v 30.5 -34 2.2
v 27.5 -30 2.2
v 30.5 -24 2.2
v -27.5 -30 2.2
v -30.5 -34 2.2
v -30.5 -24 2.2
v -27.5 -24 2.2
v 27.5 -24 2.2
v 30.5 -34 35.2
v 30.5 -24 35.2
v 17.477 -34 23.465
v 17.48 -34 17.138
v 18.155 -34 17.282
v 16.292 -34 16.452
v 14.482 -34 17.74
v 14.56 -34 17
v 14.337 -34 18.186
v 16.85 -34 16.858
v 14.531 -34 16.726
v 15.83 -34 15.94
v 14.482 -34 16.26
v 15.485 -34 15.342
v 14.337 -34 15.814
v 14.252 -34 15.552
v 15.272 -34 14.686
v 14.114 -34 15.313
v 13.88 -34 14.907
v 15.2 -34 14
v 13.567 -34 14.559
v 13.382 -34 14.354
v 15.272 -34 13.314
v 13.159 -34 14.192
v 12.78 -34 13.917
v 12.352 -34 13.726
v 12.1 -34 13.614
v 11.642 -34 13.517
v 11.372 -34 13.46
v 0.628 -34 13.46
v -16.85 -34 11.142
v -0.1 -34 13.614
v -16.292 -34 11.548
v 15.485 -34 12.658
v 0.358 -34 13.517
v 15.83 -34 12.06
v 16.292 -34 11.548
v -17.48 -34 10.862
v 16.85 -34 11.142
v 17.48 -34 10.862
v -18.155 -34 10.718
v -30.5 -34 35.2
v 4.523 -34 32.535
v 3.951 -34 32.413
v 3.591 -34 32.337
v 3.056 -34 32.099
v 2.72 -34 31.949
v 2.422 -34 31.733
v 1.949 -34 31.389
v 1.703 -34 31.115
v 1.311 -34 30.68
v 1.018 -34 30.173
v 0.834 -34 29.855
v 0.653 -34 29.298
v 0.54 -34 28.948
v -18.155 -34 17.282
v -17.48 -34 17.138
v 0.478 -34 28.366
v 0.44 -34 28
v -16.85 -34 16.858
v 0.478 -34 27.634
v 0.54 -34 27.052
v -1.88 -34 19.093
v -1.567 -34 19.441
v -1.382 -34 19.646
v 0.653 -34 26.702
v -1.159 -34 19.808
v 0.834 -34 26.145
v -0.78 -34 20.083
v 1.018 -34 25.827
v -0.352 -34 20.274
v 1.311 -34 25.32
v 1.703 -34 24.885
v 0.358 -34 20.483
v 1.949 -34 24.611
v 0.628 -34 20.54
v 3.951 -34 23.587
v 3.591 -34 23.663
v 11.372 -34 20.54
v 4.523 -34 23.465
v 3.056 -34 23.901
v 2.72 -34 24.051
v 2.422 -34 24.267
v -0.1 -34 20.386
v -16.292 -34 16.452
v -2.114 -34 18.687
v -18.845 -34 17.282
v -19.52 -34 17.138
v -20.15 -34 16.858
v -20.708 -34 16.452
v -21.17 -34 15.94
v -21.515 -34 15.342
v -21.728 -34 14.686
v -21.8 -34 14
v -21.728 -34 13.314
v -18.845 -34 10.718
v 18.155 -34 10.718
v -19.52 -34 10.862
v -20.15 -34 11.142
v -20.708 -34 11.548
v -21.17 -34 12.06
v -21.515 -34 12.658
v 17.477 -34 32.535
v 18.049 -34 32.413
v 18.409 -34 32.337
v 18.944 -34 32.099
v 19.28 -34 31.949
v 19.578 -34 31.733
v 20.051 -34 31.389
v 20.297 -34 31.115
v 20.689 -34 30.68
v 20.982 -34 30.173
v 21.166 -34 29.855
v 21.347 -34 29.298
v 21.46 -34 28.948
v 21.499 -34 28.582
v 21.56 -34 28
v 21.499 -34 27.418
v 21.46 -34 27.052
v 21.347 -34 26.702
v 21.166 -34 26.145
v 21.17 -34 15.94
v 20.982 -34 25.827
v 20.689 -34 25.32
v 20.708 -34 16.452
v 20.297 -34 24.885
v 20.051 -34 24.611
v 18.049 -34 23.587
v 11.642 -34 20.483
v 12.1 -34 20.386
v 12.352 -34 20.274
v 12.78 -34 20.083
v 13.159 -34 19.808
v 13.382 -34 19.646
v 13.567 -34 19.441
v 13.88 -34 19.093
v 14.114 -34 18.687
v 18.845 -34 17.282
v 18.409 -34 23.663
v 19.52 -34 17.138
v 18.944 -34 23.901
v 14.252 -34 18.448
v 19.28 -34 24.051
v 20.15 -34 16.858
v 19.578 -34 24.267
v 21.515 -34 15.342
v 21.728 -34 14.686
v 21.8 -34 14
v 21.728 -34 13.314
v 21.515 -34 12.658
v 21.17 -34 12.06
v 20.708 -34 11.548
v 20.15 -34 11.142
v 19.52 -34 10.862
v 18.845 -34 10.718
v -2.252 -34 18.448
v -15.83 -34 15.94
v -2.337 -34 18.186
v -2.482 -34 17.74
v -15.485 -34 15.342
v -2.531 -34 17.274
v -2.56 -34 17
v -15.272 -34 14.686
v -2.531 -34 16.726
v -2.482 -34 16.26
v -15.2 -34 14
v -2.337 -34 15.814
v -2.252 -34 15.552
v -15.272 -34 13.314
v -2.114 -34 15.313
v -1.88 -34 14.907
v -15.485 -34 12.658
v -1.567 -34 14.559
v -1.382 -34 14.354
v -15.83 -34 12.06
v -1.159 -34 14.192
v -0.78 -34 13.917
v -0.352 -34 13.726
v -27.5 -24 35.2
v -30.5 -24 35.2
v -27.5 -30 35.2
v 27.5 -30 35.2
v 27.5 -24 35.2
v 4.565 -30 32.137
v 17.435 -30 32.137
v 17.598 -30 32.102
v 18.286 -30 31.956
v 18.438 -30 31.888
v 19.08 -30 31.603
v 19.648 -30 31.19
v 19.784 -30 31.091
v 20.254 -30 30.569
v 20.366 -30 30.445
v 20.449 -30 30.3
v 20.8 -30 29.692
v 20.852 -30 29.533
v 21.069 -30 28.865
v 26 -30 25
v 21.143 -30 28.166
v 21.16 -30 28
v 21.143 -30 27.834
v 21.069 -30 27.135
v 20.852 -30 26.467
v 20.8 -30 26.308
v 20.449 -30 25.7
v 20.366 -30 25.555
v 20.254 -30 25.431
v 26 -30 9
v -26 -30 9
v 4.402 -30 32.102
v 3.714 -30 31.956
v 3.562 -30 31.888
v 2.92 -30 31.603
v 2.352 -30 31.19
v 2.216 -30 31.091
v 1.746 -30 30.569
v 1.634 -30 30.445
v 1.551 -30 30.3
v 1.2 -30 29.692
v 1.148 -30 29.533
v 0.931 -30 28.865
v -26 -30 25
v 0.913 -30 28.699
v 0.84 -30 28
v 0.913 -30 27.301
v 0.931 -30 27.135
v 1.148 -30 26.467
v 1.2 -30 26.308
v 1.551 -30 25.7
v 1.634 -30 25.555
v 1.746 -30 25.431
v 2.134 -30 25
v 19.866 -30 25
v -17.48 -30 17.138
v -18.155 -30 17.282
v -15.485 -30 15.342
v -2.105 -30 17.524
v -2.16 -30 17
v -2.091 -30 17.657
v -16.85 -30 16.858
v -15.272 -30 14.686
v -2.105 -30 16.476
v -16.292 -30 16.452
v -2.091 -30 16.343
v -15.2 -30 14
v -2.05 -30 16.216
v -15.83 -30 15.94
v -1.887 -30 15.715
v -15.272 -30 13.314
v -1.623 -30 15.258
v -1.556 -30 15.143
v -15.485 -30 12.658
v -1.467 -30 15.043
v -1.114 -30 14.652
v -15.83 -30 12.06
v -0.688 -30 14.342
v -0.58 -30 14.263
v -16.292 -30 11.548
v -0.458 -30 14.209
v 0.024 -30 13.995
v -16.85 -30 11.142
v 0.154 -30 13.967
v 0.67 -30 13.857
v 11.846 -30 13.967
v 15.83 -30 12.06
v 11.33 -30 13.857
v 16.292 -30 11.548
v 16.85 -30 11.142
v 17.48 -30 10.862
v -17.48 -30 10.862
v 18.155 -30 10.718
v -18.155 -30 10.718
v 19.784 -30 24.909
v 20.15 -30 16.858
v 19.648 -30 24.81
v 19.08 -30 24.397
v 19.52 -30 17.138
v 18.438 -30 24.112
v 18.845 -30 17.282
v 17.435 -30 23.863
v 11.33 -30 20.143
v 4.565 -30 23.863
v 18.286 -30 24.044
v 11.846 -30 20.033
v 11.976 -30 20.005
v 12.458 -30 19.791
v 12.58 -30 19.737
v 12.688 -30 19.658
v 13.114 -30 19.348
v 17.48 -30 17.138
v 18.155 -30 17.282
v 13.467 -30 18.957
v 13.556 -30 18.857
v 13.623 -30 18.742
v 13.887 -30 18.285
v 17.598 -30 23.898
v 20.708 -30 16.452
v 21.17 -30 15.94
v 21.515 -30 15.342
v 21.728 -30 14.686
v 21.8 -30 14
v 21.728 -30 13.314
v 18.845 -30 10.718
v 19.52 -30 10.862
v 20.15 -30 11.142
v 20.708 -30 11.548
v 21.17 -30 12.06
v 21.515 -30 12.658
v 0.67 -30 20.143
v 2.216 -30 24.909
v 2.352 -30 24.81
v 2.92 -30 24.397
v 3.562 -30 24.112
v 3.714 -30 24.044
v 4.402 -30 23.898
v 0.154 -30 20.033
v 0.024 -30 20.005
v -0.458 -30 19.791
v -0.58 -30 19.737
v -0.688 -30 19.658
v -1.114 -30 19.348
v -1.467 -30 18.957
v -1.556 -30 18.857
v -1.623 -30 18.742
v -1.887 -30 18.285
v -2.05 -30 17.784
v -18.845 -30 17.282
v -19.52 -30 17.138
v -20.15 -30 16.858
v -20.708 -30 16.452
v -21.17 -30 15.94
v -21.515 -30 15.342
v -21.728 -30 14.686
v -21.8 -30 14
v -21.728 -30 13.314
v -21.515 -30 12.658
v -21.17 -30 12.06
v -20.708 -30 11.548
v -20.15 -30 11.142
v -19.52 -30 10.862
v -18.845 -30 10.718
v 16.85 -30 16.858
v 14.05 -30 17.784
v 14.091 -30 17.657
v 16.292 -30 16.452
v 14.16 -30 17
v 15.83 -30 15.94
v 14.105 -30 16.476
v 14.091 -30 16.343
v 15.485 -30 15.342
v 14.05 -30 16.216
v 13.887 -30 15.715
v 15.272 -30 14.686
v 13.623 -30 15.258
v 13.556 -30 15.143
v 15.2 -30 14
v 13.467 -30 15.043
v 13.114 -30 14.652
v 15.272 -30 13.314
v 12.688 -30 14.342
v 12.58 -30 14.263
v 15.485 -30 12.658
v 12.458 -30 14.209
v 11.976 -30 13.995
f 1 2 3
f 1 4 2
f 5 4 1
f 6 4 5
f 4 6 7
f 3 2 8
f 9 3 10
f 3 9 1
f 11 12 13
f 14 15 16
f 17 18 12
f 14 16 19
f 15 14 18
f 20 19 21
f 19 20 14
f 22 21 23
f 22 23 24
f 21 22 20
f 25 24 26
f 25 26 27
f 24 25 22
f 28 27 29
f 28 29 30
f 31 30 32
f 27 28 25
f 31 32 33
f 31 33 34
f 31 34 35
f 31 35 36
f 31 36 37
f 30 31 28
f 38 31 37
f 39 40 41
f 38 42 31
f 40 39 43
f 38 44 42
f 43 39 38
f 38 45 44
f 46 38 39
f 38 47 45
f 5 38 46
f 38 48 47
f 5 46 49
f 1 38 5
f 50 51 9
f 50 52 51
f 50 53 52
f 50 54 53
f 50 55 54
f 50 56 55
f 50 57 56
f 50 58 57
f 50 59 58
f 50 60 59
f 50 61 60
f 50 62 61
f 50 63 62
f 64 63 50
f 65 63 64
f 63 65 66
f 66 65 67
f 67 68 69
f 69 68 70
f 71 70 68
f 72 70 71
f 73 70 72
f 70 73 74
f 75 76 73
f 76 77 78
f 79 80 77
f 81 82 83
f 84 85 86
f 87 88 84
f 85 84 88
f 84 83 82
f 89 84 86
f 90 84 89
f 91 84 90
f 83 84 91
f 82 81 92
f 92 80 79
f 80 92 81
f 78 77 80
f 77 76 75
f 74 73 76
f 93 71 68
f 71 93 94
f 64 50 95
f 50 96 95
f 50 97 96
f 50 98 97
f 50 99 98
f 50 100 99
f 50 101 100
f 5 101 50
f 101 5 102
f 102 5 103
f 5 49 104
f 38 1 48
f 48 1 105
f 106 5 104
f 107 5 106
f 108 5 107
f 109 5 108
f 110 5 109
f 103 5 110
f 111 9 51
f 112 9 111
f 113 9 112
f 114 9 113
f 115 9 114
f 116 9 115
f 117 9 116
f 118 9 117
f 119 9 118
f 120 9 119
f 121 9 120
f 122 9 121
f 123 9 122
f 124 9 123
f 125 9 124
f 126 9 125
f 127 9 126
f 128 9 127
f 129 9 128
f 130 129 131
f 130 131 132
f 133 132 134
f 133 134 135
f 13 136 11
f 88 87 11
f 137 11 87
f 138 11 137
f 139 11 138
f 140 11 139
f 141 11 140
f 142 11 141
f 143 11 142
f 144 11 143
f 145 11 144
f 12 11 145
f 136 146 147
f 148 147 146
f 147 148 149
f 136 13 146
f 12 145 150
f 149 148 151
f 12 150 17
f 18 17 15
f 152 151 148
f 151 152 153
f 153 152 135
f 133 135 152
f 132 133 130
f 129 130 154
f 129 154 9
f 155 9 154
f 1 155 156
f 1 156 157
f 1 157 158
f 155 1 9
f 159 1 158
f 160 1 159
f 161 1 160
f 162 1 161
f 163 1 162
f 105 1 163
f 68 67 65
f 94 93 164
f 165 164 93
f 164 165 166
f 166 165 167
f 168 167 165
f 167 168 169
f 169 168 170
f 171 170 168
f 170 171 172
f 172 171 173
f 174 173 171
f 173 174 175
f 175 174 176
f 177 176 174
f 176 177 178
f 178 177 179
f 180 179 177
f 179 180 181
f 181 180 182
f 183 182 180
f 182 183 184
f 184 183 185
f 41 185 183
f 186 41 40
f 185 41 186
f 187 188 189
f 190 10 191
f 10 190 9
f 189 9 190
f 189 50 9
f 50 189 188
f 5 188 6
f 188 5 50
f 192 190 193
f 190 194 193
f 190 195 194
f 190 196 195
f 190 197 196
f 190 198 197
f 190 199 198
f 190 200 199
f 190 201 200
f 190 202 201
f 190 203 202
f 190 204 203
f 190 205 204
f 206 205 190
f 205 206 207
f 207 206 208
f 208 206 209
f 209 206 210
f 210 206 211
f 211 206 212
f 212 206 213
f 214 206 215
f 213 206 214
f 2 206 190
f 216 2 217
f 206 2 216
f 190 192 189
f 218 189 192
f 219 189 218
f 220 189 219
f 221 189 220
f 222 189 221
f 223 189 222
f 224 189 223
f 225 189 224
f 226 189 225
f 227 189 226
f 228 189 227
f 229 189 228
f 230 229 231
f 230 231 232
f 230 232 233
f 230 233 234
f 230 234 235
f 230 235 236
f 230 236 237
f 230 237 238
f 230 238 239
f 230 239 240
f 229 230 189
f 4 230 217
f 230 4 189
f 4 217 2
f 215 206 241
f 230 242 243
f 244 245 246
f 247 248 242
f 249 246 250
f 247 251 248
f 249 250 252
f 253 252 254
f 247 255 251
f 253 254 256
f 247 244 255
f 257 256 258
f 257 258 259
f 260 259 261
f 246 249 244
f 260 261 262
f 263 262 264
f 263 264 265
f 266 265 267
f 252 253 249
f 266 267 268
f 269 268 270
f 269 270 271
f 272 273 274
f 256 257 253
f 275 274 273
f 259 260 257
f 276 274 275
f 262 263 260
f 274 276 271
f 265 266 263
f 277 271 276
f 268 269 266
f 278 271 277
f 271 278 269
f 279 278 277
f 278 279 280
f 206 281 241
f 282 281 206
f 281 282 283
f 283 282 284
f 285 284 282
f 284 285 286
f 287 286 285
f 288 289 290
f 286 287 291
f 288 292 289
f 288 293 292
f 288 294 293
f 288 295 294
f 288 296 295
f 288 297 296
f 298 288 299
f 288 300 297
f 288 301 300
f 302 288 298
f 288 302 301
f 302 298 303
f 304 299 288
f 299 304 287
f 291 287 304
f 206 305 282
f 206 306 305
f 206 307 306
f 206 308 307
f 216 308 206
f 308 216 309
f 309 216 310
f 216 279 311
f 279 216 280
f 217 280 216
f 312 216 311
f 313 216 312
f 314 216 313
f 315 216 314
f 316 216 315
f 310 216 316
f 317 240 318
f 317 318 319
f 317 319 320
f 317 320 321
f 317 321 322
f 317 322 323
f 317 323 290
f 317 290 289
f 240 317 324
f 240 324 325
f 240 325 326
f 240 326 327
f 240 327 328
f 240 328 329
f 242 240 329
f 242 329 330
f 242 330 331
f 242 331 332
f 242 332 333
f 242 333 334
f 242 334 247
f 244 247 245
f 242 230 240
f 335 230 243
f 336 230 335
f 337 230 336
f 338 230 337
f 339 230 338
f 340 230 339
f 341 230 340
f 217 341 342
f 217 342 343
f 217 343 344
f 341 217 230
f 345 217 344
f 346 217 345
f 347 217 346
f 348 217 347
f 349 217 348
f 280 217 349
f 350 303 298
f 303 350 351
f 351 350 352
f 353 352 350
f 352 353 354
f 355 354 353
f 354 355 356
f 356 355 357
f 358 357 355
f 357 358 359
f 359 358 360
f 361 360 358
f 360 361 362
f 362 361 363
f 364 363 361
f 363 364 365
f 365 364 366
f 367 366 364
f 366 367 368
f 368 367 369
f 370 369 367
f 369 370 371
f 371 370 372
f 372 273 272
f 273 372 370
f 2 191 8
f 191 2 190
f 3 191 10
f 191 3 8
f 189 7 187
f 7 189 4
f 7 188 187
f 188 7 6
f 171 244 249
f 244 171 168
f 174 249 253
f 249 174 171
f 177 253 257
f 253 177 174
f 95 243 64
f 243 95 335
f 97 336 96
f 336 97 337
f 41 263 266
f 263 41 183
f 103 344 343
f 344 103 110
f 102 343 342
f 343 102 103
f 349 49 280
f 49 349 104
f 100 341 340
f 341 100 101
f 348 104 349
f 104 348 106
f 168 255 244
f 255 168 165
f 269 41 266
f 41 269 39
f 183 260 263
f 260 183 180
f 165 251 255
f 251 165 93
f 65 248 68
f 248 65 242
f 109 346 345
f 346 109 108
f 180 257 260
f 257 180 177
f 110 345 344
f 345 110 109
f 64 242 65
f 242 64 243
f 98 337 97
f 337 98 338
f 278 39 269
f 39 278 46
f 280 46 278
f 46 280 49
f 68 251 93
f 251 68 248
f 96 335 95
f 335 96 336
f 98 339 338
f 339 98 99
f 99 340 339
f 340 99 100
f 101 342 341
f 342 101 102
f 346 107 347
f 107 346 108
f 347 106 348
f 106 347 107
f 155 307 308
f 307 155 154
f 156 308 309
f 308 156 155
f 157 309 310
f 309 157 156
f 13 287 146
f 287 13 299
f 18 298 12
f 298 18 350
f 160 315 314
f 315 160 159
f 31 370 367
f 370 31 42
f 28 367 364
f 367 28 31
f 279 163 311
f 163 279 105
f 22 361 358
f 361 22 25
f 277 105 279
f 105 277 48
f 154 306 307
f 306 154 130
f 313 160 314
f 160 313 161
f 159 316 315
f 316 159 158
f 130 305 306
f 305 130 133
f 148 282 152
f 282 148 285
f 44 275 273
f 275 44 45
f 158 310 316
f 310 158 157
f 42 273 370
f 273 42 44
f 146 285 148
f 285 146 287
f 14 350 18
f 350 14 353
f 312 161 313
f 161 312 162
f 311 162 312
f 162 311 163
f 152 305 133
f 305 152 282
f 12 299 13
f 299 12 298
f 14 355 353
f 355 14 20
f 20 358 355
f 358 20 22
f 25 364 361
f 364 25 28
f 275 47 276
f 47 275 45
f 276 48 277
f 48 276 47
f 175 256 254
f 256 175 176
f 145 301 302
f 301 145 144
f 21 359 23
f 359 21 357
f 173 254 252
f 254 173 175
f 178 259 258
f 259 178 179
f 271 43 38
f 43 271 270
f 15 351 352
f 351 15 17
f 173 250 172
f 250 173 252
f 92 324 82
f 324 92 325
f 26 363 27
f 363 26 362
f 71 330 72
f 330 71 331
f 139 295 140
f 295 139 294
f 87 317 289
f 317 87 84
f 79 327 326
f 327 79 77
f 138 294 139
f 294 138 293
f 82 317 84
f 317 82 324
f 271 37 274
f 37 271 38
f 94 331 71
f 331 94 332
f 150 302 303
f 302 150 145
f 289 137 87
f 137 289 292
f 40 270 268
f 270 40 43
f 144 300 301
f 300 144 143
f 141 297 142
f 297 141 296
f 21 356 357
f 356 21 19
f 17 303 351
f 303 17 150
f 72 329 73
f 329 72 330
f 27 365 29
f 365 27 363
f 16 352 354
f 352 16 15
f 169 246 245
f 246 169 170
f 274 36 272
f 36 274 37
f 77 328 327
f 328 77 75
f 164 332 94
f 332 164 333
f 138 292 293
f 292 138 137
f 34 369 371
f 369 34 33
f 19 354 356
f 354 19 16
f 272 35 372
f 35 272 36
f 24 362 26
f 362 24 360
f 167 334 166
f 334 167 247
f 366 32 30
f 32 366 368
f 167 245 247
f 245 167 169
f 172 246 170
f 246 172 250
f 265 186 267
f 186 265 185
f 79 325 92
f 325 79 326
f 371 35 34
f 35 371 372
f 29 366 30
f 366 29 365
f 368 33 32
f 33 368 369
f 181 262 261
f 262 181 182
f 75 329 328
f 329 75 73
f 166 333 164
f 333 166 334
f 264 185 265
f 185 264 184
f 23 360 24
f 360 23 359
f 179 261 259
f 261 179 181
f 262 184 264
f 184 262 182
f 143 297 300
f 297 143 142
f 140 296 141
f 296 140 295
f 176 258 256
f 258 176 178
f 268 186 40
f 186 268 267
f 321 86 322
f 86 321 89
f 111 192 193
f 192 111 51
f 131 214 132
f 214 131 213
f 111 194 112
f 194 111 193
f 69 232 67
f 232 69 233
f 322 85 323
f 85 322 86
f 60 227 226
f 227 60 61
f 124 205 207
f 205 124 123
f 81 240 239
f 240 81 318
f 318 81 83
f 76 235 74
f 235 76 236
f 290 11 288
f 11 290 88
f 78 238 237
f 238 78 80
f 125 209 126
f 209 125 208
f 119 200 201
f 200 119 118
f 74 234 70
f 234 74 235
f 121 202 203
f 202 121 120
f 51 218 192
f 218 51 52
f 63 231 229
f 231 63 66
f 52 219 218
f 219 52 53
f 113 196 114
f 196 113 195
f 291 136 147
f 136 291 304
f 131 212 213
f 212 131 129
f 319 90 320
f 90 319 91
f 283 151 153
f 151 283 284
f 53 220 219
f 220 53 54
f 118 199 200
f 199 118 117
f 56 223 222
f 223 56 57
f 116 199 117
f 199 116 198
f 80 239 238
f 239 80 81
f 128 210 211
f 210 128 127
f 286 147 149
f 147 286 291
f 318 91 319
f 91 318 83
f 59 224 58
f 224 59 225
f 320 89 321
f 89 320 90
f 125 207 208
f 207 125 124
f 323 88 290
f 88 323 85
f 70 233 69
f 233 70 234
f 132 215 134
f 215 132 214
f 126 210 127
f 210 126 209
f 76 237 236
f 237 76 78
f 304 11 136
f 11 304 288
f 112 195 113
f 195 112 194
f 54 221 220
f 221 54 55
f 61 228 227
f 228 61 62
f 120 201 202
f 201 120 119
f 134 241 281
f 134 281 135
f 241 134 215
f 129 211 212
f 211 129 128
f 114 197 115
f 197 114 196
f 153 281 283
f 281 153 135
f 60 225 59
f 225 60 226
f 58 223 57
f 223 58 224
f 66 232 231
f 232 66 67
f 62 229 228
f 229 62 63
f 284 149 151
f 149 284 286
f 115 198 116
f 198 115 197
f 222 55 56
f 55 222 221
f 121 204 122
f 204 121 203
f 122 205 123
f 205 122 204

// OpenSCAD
difference(){
    // Support for the 7a chassis
    pad = 0.0;
    union(){
    color("pink"){
        translate([0,-32,5.2-3])
        linear_extrude(height=30+3)
        offset(r=pad)
        square(size=[61,4],center=true);

        translate([29,-29,5.2-3])
        linear_extrude(height=30+3)
        offset(r=pad)
        square(size=[3,10],center=true);

        translate([-29,-29,5.2-3])
        linear_extrude(height=30+3)
        offset(r=pad)
        square(size=[3,10],center=true);
    }
}


//==============================
// chassis
translate([-27,-30,9]) rotate([0,0,0])
union(){
// 7a chassis
B1p=[ [0,1], [1,0], [53,0], [54,1], [54,79], [48,85], [6,85], [0,79] ];
translate([0,0,0]) color("gray")
linear_extrude(height=16)
polygon(points=B1p);
// wiring rises above chassis
linear_extrude(height=26)
offset(r=-2) polygon(points=B1p);

// Switch 1
translate([2,1.6,0]) color("blue"){
    union(){
        // switch body including solder lug clearance
        linear_extrude(height=12) 
        offset(r=0.2)
         square(size=[13, 15]);
        
        translate([6.5,0,5]) rotate([90,0,0]) cylinder(r=3.3,h=10,$fn=30);
    }
}
// Switch 2
translate([54-15,1.6,0]) color("blue"){
    union(){
        // switch body including solder lug clearance
        linear_extrude(height=12) 
        offset(r=0.2)
         square(size=[13, 15]);
        
        translate([6.5,0,5]) rotate([90,0,0]) cylinder(r=3.3,h=10,$fn=30);
    }
}

// Cutout for pogo access
hull(){
translate([28,1.6,8]) color("blue"){
       rotate([90,0,0]) cylinder(r1=3,r2=4,h=10,$fn=30);
}
translate([38,1.6,8]) color("blue"){
       rotate([90,0,0]) cylinder(r1=3,r2=4,h=10,$fn=30);
}
}

// Cutout for usb access
hull(){
translate([32,1.6,19]) color("blue"){
       rotate([90,0,0]) cylinder(r1=4,r2=5,h=10,$fn=30);
}
translate([44,1.6,19]) color("blue"){
       rotate([90,0,0]) cylinder(r1=4,r2=5,h=10,$fn=30);
}
}

}

}
